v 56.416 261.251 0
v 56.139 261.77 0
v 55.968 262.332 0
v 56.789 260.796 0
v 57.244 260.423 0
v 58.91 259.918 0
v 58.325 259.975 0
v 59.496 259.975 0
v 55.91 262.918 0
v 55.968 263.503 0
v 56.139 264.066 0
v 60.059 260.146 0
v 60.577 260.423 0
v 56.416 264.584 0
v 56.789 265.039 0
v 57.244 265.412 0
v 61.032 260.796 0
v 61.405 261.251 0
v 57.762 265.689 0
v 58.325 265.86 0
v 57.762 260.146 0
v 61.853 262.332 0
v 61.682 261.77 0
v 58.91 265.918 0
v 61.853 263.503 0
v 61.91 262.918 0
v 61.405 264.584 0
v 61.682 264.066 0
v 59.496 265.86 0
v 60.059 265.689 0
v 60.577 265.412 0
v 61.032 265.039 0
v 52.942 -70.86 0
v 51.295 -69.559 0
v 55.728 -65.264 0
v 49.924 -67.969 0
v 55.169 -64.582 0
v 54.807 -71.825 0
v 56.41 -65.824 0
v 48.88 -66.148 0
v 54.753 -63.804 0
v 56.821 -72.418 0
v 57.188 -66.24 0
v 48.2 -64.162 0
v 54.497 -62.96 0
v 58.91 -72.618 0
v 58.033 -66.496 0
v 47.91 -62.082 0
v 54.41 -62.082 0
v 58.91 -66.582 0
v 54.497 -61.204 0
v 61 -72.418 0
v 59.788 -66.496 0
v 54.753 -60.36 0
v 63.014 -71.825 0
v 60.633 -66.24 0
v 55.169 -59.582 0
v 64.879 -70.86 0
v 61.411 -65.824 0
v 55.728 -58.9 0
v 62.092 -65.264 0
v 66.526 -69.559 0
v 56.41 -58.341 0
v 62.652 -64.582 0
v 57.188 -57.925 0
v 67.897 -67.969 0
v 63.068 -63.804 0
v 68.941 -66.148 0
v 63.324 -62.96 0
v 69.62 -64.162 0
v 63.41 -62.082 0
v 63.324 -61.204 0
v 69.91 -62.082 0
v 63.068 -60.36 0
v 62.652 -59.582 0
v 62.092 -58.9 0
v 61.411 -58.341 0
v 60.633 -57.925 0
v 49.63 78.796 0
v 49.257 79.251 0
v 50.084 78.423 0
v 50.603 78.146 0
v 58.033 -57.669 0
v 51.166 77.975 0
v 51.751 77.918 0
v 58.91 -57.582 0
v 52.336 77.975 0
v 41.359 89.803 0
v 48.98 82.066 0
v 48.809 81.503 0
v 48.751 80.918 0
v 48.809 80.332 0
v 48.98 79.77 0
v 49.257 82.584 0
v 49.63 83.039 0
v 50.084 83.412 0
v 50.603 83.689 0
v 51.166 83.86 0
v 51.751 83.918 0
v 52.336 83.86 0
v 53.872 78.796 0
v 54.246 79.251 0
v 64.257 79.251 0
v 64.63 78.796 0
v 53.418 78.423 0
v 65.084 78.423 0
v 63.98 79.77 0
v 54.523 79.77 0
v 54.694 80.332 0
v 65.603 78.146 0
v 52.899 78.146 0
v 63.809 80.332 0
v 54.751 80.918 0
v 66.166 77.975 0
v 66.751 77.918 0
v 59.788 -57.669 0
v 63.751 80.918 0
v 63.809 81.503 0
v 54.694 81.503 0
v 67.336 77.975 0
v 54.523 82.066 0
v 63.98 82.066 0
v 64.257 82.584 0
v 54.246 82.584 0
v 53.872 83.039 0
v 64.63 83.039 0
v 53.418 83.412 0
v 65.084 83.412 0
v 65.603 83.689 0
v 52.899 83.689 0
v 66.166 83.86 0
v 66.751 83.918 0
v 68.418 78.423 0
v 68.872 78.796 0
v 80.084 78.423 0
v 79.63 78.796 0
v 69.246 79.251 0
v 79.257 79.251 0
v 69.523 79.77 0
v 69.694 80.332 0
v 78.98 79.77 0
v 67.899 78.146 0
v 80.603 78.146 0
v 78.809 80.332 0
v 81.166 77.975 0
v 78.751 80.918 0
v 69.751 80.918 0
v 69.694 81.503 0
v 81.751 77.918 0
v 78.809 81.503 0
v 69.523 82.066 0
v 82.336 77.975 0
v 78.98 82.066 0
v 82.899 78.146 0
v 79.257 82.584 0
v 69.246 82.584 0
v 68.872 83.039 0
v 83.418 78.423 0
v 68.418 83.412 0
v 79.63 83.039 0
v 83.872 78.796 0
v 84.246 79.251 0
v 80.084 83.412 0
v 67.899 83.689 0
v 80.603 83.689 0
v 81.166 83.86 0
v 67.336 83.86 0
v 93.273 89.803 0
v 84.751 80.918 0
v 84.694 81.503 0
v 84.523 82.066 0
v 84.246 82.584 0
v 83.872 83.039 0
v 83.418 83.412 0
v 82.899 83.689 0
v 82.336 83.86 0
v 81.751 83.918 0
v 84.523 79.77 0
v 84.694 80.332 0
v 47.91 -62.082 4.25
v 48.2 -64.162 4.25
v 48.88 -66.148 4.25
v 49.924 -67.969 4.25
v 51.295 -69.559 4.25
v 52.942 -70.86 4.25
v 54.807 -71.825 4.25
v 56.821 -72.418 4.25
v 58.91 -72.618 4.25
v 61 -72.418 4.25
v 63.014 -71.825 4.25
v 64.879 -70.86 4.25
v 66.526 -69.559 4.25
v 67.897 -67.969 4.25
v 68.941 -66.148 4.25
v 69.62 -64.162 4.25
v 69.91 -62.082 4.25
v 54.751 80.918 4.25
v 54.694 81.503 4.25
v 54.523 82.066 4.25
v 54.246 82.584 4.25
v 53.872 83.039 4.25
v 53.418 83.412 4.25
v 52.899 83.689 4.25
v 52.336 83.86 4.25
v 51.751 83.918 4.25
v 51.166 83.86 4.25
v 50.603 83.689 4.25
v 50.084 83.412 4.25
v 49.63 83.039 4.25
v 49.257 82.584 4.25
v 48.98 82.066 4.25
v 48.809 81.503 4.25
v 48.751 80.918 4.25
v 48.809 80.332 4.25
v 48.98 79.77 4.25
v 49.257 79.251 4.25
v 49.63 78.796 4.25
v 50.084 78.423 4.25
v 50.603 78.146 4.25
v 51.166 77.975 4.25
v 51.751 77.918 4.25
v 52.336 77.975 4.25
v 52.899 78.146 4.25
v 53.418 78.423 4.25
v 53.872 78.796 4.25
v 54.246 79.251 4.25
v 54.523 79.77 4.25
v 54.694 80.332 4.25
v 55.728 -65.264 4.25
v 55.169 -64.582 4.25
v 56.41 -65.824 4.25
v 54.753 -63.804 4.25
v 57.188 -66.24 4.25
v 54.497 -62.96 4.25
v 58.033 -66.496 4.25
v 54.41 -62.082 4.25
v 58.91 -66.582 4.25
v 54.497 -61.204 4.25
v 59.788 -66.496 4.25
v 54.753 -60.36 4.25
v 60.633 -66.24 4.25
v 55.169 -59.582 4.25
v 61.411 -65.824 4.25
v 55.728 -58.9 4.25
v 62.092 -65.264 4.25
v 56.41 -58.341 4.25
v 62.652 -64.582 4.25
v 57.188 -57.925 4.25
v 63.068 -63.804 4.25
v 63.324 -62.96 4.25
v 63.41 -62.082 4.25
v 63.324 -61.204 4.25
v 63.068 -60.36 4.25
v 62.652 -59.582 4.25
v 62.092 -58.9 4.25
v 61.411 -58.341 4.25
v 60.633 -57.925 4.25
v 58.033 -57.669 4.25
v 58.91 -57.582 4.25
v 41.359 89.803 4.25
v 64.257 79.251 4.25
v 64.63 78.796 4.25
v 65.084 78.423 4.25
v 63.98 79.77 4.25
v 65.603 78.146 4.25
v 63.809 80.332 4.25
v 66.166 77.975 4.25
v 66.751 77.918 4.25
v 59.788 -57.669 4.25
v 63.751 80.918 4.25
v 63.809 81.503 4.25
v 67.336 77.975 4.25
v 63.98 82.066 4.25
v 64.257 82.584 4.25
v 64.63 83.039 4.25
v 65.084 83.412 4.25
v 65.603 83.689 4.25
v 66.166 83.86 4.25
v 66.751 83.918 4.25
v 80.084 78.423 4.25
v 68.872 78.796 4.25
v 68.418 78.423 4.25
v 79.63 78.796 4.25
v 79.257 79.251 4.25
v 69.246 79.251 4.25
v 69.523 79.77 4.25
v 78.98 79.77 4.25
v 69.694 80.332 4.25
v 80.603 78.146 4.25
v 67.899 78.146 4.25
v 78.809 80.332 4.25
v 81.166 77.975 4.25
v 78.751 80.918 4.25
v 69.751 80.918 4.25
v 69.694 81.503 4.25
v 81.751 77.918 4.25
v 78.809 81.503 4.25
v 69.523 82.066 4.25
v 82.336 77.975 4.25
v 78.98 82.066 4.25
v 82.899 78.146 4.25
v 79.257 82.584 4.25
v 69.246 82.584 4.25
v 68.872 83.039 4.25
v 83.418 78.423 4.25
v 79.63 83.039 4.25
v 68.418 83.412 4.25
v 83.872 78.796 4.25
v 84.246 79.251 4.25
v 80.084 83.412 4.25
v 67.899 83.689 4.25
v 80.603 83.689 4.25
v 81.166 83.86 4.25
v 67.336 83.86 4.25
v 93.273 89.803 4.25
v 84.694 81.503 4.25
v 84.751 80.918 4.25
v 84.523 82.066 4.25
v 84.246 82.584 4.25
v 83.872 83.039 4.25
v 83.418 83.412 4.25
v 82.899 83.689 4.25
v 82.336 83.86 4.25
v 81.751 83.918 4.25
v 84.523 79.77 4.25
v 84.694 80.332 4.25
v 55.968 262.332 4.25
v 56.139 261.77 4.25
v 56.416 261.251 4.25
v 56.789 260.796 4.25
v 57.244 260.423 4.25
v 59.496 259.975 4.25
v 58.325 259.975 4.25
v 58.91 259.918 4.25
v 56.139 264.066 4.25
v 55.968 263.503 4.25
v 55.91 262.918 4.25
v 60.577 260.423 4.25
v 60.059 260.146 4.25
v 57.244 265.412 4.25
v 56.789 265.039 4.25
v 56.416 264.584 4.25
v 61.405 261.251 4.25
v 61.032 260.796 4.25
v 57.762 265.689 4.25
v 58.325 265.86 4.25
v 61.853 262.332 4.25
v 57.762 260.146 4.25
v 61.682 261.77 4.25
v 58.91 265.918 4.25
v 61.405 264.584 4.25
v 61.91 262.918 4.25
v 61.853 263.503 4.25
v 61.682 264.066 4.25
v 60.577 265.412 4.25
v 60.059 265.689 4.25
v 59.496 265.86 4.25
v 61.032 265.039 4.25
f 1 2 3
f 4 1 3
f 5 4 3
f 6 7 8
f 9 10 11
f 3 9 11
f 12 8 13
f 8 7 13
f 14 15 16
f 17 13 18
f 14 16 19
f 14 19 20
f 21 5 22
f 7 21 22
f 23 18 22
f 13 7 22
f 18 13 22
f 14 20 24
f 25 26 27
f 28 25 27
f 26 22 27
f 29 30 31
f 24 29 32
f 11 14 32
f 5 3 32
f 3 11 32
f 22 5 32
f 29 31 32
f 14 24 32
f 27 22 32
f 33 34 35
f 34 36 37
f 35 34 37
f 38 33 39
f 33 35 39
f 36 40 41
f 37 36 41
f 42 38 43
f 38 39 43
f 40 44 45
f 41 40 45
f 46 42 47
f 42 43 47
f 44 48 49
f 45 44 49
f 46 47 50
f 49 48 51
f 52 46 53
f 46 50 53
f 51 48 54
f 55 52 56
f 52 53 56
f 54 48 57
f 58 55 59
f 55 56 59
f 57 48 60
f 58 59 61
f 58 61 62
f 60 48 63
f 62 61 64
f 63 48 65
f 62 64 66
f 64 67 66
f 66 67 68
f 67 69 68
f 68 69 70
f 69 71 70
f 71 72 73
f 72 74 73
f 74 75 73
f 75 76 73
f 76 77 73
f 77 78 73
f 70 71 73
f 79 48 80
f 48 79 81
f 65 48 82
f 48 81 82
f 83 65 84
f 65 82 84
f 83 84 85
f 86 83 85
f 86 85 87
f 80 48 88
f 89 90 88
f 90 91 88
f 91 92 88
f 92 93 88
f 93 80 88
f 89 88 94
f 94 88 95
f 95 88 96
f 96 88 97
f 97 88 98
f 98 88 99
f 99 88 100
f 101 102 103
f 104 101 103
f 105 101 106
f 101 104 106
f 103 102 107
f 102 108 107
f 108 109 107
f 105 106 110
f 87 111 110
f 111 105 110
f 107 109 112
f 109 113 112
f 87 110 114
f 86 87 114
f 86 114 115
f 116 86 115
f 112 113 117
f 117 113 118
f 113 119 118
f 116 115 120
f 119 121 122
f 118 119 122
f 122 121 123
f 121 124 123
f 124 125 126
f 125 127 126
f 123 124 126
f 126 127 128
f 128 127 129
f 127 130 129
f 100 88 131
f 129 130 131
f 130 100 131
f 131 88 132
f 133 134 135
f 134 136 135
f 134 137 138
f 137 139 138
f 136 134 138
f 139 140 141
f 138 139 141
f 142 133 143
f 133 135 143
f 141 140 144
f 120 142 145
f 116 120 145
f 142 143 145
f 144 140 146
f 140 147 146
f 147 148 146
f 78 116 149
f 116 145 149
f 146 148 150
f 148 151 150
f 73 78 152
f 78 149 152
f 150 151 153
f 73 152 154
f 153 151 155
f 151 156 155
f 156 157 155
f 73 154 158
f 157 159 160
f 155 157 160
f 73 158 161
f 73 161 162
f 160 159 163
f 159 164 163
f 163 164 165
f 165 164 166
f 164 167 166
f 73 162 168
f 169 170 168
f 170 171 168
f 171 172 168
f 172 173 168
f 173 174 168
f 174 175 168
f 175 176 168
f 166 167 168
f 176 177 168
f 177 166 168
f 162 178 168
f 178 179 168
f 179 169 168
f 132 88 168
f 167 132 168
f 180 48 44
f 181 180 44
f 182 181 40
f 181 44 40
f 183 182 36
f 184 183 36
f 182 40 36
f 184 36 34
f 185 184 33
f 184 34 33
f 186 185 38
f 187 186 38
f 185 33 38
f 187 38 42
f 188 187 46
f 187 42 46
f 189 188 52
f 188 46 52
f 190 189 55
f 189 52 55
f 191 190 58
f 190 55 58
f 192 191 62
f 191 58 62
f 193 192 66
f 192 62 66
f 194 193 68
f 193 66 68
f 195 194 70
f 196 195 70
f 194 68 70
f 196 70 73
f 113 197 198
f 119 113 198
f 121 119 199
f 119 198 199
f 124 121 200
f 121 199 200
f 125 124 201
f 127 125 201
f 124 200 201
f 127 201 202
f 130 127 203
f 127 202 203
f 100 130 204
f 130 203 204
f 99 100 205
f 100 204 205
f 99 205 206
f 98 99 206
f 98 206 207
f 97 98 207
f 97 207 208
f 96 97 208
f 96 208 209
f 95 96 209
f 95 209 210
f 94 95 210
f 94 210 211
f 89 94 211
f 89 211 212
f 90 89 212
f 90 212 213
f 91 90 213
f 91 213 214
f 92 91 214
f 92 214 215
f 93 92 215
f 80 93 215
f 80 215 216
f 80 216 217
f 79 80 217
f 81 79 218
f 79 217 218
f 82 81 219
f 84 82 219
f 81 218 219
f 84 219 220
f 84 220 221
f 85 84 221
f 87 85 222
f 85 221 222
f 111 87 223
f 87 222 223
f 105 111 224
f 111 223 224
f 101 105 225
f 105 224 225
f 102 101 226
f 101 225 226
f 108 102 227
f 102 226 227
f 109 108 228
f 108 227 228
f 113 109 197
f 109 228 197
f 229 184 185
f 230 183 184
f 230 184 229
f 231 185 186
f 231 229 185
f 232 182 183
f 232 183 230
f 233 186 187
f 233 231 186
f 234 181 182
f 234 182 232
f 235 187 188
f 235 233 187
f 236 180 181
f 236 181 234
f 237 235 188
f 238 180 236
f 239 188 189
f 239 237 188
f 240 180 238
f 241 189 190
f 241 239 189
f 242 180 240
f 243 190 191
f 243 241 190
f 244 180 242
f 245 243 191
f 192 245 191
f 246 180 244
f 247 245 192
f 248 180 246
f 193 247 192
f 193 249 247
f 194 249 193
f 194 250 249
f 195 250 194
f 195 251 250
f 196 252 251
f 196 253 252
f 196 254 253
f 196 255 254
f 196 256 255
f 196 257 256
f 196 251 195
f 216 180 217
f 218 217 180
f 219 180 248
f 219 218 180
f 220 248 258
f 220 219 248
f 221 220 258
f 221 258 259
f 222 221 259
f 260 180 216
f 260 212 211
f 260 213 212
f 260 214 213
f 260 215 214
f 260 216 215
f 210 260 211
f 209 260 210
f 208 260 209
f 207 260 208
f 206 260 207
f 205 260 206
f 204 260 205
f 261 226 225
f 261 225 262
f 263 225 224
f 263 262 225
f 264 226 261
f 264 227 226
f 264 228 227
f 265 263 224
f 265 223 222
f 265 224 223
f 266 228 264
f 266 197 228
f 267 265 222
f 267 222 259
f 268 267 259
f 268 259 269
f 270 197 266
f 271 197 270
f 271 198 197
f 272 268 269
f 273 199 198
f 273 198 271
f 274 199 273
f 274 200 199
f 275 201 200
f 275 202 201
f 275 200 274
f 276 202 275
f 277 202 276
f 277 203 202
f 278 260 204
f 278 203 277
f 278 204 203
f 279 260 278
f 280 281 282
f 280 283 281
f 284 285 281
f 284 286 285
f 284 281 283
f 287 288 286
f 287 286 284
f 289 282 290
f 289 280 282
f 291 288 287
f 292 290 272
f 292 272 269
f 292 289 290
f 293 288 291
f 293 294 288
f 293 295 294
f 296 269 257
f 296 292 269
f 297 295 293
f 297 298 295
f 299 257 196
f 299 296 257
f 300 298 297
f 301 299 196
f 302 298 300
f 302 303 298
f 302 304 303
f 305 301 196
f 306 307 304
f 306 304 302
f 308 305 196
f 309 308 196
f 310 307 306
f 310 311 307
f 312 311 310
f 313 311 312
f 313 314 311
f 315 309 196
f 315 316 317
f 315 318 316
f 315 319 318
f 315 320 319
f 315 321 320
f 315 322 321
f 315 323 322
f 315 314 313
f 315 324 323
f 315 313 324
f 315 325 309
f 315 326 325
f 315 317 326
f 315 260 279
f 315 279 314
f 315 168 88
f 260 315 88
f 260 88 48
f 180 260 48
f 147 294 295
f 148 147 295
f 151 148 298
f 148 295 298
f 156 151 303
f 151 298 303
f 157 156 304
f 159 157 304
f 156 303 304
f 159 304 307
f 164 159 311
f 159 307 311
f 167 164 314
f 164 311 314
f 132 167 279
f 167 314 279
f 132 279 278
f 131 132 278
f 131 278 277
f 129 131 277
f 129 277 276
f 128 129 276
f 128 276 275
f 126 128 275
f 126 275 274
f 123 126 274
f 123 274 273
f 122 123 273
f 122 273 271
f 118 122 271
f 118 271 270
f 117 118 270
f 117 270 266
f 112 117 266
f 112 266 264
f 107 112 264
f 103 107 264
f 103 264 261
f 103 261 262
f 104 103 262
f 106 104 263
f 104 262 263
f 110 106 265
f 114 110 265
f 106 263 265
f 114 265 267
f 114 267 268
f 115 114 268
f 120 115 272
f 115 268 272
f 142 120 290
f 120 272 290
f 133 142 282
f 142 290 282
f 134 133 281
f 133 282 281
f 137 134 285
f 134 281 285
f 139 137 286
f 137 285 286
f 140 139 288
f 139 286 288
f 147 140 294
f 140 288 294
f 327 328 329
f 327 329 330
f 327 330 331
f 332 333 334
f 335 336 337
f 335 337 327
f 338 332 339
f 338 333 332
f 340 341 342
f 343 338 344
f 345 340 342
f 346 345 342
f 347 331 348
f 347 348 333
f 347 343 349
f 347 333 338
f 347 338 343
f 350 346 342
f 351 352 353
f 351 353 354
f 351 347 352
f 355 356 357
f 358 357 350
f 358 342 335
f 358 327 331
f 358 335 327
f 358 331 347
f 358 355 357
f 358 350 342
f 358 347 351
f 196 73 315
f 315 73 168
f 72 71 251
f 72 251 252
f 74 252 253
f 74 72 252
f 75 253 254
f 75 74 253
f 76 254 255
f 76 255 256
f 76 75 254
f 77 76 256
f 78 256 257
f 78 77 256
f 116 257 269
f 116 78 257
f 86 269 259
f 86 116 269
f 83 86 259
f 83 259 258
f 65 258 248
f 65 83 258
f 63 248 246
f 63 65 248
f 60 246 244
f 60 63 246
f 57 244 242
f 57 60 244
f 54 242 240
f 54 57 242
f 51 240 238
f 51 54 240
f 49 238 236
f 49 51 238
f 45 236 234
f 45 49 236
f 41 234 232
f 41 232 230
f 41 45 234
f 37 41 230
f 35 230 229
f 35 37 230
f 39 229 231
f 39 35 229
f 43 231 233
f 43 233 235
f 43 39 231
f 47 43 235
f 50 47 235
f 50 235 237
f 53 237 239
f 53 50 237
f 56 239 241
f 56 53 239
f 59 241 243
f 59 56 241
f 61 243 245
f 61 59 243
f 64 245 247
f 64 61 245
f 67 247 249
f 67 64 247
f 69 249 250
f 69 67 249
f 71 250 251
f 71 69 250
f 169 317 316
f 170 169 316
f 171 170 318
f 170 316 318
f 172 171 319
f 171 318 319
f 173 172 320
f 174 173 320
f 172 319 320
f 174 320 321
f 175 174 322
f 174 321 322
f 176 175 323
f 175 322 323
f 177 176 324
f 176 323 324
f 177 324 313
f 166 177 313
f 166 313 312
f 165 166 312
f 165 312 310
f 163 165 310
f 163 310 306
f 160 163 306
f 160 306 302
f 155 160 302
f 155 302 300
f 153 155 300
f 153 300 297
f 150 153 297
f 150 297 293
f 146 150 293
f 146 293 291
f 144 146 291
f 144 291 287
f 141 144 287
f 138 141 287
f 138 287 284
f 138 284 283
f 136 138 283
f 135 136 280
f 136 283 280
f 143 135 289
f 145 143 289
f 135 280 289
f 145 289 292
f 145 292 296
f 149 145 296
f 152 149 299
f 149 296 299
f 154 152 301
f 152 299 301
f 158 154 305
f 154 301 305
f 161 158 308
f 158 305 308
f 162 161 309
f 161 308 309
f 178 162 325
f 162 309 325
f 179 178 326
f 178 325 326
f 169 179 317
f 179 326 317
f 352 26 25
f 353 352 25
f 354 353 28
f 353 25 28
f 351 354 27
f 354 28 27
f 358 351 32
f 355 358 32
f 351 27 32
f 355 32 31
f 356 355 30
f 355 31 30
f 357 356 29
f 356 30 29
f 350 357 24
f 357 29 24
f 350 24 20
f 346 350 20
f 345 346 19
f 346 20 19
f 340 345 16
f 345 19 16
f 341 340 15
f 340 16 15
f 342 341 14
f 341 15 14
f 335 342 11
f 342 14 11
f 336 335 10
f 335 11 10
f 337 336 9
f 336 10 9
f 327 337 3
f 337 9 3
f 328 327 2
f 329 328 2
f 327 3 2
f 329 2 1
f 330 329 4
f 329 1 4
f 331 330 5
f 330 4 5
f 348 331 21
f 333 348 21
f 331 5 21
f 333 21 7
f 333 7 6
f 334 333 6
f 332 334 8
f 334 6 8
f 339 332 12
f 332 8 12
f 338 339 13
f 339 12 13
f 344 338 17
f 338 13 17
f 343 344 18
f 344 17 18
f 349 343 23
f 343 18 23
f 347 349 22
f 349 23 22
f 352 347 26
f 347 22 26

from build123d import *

# Parameters (mm, degrees)
SKETCH1_R             = 3
BOSS_EXTRUDE1_DEPTH   = 4.25
SKETCH1_R_2           = 4.5
BOSS_EXTRUDE1_2_DEPTH = 4.25
SKETCH2_R             = 3
CUT_EXTRUDE1_DEPTH    = 10


with BuildPart() as part:
    # Sketch1 → Boss-Extrude1 (new body)
    with BuildSketch(Plane.XY):
        with Locations((58.910480371, 262.917677392)):
            Circle(SKETCH1_R)
    extrude(amount=BOSS_EXTRUDE1_DEPTH)


with BuildPart() as body_2:
    # Sketch1 → Boss-Extrude1 2 (new body)
    with BuildSketch(Plane.XY):
        with BuildLine():
            Line((41.358559026, 89.803126741), (47.910480371, -62.082322608))
            ThreePointArc((47.910480371, -62.082322608), (58.910480371, -72.618042573), (69.910480371, -62.082322608))
            Line((69.910480371, -62.082322608), (93.272734055, 89.803126741))
            Line((93.272734055, 89.803126741), (41.358559026, 89.803126741))
        make_face()
        with Locations((58.910480371, -62.082322608)):
            Circle(SKETCH1_R_2, mode=Mode.SUBTRACT)
    extrude(amount=BOSS_EXTRUDE1_2_DEPTH)

    # Sketch2 → Cut-Extrude1 (cut)
    with BuildSketch(Plane.XY.offset(4.25)):
        with Locations((51.751152709, 80.917677392)):
            Circle(SKETCH2_R)
        with Locations((66.751152709, 80.917677392)):
            Circle(SKETCH2_R)
        with Locations((81.751152709, 80.917677392)):
            Circle(SKETCH2_R)
    extrude(amount=-CUT_EXTRUDE1_DEPTH, mode=Mode.SUBTRACT)


solid = Compound([part.part, body_2.part])
